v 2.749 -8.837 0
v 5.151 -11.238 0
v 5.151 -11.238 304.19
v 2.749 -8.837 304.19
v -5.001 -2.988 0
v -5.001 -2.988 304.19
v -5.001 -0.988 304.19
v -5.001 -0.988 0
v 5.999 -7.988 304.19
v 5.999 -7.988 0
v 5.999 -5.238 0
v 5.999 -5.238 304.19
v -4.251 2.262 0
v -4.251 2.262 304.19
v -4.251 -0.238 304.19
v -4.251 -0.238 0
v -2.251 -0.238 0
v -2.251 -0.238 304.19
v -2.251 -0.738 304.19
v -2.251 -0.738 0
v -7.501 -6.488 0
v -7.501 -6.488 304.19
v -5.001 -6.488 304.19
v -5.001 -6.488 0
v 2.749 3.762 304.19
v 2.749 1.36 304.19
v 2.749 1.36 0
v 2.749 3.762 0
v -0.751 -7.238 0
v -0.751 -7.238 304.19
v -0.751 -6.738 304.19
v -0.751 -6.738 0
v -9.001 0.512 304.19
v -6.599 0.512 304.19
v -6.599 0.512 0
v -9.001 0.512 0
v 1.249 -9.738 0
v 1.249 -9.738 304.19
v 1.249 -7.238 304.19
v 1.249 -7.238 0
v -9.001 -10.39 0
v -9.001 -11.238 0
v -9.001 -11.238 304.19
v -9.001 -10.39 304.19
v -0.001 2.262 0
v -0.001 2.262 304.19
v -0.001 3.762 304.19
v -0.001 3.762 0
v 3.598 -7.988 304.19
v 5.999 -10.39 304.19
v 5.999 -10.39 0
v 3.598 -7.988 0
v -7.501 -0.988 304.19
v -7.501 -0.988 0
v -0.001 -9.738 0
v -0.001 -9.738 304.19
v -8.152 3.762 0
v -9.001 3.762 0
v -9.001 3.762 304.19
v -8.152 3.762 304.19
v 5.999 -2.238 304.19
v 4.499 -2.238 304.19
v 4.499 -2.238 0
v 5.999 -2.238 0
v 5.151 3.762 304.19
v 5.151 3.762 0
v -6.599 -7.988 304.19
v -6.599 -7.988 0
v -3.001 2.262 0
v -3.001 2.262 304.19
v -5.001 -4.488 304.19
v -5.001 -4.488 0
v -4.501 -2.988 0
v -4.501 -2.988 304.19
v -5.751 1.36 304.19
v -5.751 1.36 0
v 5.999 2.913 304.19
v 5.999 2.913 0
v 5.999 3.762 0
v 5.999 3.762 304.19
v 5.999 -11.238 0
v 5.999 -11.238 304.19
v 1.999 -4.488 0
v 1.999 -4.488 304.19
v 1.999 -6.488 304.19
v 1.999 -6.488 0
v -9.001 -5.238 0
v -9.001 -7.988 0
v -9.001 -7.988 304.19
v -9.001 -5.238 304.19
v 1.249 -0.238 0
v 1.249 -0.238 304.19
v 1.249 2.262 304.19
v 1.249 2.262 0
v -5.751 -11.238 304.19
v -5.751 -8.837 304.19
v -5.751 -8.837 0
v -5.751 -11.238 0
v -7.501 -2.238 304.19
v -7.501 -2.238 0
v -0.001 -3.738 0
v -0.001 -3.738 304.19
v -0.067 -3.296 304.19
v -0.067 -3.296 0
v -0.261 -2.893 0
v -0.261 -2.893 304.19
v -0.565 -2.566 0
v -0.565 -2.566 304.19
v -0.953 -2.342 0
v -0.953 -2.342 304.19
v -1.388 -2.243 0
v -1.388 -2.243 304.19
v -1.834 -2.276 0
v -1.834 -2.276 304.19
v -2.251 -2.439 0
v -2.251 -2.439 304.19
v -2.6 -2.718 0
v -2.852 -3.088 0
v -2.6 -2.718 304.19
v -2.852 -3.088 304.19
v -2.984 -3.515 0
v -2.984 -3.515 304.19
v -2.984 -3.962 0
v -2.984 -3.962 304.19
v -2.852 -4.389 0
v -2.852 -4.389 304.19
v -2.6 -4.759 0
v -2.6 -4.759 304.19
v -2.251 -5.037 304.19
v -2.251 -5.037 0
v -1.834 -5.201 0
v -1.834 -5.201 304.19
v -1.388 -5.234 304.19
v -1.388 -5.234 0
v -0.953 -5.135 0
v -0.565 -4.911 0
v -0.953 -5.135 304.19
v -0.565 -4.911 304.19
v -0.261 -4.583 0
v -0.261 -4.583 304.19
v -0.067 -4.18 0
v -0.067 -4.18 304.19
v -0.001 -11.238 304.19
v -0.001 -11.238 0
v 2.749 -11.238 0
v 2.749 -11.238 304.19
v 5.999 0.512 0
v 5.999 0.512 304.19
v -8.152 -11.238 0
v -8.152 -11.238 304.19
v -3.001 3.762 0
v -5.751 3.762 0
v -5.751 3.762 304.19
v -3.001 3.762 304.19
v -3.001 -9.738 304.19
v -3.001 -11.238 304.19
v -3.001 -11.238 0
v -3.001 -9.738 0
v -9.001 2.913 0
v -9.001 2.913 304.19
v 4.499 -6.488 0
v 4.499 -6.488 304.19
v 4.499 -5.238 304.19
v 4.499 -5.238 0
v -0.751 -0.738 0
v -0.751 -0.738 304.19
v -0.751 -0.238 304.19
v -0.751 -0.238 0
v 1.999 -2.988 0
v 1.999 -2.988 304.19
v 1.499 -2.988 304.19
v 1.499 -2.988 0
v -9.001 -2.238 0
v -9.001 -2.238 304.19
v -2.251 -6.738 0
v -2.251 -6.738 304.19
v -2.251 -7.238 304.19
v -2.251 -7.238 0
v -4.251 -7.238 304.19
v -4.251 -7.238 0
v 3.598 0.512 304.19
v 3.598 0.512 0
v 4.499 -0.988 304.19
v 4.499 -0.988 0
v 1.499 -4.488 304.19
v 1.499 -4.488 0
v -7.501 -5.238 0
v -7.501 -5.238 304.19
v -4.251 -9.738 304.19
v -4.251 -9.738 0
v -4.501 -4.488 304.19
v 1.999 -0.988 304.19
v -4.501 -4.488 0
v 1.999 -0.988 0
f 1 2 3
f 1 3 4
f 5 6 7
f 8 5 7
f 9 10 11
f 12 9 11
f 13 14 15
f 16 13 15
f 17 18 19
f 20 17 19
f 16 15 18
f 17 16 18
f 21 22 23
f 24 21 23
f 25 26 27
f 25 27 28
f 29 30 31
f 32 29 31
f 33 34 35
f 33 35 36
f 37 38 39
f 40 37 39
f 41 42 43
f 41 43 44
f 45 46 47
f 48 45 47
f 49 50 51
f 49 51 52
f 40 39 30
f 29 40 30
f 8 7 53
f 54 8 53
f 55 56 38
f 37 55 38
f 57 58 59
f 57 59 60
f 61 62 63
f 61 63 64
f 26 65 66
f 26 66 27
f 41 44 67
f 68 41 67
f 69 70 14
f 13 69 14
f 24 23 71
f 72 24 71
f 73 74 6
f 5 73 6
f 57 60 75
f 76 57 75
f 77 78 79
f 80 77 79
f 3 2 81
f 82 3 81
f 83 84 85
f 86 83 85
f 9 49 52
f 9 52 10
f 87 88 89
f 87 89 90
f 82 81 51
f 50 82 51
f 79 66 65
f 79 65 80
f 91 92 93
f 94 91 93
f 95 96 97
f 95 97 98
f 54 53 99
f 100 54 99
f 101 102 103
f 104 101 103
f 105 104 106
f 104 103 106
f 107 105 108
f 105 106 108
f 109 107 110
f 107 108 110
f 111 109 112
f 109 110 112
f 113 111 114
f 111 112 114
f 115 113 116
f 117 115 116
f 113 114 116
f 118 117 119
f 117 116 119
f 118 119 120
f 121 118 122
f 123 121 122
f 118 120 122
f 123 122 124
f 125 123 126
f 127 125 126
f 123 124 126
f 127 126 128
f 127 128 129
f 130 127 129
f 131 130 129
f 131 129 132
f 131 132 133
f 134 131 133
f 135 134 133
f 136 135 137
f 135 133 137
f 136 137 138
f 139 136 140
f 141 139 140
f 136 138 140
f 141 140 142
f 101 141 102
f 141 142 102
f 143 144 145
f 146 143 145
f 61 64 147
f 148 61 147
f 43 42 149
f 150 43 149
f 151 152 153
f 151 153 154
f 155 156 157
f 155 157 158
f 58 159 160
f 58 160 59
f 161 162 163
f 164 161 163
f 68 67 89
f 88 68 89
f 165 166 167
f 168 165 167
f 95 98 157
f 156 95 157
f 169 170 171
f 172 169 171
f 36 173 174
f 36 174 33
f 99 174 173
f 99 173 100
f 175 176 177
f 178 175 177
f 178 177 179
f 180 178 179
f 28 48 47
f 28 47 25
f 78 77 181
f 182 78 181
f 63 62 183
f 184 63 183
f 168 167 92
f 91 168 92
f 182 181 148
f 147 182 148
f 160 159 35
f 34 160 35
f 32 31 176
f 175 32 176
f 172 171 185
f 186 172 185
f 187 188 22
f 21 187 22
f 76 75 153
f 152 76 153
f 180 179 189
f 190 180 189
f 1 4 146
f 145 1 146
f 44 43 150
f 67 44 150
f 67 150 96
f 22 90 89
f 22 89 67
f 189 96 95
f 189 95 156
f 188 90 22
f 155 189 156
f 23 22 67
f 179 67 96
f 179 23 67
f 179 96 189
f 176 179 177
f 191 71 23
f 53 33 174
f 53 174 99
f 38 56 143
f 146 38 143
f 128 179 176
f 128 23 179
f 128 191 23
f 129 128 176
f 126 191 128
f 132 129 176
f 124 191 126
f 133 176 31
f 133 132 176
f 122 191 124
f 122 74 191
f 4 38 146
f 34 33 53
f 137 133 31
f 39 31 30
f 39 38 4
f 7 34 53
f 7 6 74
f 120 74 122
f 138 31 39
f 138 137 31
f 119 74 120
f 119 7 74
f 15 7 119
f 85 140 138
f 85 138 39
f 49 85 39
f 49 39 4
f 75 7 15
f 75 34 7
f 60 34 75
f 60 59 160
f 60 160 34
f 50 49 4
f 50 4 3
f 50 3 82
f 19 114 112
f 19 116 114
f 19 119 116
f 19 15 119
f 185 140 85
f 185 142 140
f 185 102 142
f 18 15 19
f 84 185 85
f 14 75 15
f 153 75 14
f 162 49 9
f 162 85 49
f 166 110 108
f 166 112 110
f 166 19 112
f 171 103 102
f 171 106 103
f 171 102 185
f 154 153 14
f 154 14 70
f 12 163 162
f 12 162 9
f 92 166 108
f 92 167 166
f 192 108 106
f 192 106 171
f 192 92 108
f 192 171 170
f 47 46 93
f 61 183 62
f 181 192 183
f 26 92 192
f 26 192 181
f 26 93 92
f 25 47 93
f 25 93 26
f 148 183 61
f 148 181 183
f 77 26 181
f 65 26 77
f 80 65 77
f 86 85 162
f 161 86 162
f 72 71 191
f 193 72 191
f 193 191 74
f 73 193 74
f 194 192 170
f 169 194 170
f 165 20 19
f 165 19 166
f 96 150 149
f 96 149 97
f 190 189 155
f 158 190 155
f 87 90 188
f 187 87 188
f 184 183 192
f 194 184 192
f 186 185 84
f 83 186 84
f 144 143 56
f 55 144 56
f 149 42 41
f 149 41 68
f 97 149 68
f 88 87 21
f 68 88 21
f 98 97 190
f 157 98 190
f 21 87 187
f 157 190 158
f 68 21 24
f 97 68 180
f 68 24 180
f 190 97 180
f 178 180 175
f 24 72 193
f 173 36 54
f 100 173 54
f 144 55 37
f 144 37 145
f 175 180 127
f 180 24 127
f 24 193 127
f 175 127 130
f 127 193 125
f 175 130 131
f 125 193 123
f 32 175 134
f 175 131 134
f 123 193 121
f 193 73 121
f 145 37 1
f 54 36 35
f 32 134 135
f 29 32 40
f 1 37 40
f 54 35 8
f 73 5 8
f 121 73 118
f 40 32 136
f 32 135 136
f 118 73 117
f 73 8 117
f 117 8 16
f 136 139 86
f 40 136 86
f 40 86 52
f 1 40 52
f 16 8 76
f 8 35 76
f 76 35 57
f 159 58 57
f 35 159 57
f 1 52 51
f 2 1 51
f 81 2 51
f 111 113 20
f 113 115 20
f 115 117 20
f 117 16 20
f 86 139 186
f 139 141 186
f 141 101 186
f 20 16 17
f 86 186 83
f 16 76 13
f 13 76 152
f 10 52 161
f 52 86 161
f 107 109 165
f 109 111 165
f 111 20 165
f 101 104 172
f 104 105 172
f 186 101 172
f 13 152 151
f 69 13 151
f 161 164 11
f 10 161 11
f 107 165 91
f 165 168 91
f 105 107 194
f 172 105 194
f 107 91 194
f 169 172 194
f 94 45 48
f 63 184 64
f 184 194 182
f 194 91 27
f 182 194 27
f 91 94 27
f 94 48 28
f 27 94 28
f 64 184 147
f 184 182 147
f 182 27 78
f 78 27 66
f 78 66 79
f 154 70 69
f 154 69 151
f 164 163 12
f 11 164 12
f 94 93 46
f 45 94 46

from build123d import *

# Parameters (mm, degrees)
SKETCH1_W           = 15
SKETCH1_H           = 15
BOSS_EXTRUDE1_DEPTH = 304.19
SKETCH2_R           = 1.5
CUT_EXTRUDE1_DEPTH  = 304.19
SKETCH3_W           = 3
SKETCH3_H           = 1.5
SKETCH3_W_2         = 1.5
SKETCH3_H_2         = 3
CUT_EXTRUDE2_DEPTH  = 304.19


with BuildPart() as part:
    # Sketch1 → Boss-Extrude1 (new body)
    with BuildSketch(Plane.XY):
        with Locations((-1.500578266, -3.738353388)):
            Rectangle(SKETCH1_W, SKETCH1_H)
    extrude(amount=BOSS_EXTRUDE1_DEPTH)

    # Sketch2 → Cut-Extrude1 (cut)
    with BuildSketch(Plane.XY.offset(304.19)):
        with Locations((-1.500578266, -3.738353388)):
            Circle(SKETCH2_R)
        Polygon((1.999421734, -4.488353388), (1.999421734, -6.488353388), (4.499421734, -6.488353388), (4.499421734, -0.988353388), (1.999421734, -0.988353388), (1.999421734, -2.988353388), (1.499421734, -2.988353388), (1.499421734, -4.488353388), align=None)
        Polygon((-4.250578266, -7.238353388), (-4.250578266, -9.738353388), (1.249421734, -9.738353388), (1.249421734, -7.238353388), (-0.750578266, -7.238353388), (-0.750578266, -6.738353388), (-2.250578266, -6.738353388), (-2.250578266, -7.238353388), align=None)
        Polygon((-5.000578266, -0.988353388), (-7.500578266, -0.988353388), (-7.500578266, -6.488353388), (-5.000578266, -6.488353388), (-5.000578266, -4.488353388), (-4.500578266, -4.488353388), (-4.500578266, -2.988353388), (-5.000578266, -2.988353388), align=None)
        Polygon((1.249421734, -0.238353388), (1.249421734, 2.261646612), (-4.250578266, 2.261646612), (-4.250578266, -0.238353388), (-2.250578266, -0.238353388), (-2.250578266, -0.738353388), (-0.750578266, -0.738353388), (-0.750578266, -0.238353388), align=None)
    extrude(amount=-CUT_EXTRUDE1_DEPTH, mode=Mode.SUBTRACT)

    # Sketch3 → Cut-Extrude2 (cut)
    with BuildSketch(Plane.XY.offset(304.19)):
        Polygon((5.150893596, 3.761646612), (2.749421734, 1.360174749), (2.749421734, 3.761646612), align=None)
        Polygon((5.999421734, 0.511646612), (5.999421734, 2.913118474), (3.597949871, 0.511646612), align=None)
        with Locations((-1.500578266, 3.011646612)):
            Rectangle(SKETCH3_W, SKETCH3_H)
        Polygon((2.749421734, -8.836881526), (2.749421734, -11.238353388), (5.150893596, -11.238353388), align=None)
        Polygon((5.999421734, -10.389825251), (3.597949871, -7.988353388), (5.999421734, -7.988353388), align=None)
        with Locations((5.249421734, -3.738353388)):
            Rectangle(SKETCH3_W_2, SKETCH3_H_2)
        Polygon((-6.599106404, -7.988353388), (-9.000578266, -7.988353388), (-9.000578266, -10.389825251), align=None)
        Polygon((-8.152050129, -11.238353388), (-5.750578266, -8.836881526), (-5.750578266, -11.238353388), align=None)
        with Locations((-1.500578266, -10.488353388)):
            Rectangle(SKETCH3_W, SKETCH3_H)
        Polygon((-5.750578266, 1.360174749), (-5.750578266, 3.761646612), (-8.152050129, 3.761646612), align=None)
        Polygon((-9.000578266, 2.913118474), (-6.599106404, 0.511646612), (-9.000578266, 0.511646612), align=None)
        with Locations((-8.250578266, -3.738353388)):
            Rectangle(SKETCH3_W_2, SKETCH3_H_2)
    extrude(amount=-CUT_EXTRUDE2_DEPTH, mode=Mode.SUBTRACT)


solid = part.part
